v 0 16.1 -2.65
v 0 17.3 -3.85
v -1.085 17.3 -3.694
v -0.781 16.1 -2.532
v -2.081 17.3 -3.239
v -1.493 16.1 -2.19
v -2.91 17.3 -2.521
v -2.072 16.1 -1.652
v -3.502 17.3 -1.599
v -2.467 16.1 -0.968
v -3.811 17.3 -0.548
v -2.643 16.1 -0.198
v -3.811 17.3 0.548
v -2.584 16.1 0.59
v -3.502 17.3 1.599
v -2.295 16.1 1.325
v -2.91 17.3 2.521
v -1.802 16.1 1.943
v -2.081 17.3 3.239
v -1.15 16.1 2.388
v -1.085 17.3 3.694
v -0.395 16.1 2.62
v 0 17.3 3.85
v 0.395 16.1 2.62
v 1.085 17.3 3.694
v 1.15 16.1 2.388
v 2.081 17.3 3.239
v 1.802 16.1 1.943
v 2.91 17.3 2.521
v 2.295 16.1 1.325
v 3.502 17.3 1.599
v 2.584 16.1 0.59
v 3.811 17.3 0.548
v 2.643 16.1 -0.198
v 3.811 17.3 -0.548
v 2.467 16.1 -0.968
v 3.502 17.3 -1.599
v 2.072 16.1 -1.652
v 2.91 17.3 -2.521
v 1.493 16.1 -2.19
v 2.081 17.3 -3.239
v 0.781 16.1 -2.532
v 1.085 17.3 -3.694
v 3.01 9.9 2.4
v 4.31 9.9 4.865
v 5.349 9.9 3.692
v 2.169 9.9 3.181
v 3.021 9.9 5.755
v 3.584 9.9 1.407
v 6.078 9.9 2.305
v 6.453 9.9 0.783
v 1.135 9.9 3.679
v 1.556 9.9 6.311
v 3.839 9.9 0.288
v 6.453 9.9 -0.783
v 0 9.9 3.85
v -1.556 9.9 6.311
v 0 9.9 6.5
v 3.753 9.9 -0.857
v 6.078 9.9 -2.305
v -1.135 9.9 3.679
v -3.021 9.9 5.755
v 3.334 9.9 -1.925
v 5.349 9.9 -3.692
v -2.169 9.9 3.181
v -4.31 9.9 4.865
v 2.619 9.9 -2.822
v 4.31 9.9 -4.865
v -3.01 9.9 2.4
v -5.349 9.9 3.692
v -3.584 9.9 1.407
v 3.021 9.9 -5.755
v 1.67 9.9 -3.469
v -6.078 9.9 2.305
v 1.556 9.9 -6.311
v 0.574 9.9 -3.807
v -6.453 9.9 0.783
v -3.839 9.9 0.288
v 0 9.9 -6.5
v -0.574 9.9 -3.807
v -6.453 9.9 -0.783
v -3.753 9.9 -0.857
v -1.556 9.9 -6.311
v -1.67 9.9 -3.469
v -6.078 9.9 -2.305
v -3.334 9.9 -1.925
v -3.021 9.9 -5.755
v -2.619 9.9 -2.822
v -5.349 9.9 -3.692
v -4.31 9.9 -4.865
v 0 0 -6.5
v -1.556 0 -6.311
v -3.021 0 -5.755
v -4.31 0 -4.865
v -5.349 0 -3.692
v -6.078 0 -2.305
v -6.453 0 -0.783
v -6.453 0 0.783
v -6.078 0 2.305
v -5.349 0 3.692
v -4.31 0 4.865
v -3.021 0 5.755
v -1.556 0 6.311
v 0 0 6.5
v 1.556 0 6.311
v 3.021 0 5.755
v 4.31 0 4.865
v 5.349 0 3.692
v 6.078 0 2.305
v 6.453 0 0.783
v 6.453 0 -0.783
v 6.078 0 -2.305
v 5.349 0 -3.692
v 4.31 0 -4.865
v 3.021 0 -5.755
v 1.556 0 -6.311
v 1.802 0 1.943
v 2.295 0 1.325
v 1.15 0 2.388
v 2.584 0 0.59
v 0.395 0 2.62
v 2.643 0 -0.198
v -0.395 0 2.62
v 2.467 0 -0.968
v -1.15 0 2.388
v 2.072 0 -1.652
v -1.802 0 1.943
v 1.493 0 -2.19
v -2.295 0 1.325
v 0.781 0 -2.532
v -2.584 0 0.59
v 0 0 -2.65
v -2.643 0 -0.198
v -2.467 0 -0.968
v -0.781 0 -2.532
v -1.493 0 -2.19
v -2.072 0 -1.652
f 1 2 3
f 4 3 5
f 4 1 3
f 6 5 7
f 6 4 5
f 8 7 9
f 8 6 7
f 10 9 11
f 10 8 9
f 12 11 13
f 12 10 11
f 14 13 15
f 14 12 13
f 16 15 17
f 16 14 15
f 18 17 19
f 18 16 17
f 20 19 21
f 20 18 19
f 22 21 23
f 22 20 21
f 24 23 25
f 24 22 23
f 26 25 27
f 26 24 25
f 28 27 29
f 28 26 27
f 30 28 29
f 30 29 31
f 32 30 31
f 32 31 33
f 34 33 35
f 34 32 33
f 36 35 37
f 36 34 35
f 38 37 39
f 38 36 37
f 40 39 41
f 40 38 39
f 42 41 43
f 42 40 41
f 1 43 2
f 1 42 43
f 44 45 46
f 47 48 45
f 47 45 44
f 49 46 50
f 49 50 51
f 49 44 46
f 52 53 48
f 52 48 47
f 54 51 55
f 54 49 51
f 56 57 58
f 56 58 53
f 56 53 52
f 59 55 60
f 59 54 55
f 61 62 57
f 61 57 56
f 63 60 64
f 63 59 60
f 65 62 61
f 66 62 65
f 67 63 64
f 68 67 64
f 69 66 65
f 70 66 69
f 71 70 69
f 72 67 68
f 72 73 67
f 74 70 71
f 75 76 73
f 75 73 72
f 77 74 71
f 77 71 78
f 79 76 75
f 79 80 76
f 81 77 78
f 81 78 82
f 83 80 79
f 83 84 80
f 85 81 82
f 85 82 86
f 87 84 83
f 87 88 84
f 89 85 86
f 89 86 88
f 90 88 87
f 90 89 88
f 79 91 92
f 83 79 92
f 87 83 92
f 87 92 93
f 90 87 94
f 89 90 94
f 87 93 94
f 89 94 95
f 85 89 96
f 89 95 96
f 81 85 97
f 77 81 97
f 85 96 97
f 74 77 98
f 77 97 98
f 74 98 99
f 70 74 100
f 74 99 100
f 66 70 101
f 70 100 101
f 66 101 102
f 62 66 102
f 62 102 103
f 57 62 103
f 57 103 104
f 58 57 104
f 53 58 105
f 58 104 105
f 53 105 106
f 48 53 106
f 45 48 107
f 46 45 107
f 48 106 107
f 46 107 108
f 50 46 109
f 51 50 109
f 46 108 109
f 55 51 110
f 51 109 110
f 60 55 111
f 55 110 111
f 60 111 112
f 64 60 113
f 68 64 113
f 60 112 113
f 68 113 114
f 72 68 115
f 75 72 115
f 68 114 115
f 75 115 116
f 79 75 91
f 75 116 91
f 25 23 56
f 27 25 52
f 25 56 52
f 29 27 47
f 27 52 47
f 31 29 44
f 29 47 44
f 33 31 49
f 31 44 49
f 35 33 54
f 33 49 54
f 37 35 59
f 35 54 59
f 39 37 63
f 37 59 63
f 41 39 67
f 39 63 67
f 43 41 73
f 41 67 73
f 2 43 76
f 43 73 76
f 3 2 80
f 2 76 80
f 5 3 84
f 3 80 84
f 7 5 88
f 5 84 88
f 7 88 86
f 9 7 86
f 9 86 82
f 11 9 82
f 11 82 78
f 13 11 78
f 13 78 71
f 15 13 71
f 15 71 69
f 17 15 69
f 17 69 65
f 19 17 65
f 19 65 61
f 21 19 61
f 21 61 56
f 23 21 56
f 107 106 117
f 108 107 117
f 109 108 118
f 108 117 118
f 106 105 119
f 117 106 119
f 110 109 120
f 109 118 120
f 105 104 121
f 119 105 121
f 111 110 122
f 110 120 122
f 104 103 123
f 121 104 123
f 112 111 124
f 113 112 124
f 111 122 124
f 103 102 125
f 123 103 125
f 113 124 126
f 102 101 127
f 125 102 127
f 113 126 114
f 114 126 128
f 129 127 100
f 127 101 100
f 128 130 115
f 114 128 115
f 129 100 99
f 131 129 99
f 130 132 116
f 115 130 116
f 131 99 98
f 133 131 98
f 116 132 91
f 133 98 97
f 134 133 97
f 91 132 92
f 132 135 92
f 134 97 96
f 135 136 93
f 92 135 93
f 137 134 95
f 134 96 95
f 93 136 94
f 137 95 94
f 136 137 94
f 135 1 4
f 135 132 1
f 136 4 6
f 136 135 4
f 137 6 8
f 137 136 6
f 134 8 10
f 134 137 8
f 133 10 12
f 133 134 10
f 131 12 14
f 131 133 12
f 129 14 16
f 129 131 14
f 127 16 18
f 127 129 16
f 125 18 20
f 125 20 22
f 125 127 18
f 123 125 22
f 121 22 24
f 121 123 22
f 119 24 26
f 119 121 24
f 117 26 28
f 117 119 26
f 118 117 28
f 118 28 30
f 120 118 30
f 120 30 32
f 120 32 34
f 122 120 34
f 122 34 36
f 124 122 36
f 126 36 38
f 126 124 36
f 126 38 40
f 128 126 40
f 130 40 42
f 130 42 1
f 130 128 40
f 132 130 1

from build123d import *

# Parameters (mm, degrees)
ESQUISSE1_R        = 6.5
ESQUISSE1_R_2      = 2.65
BOSS_EXTRU_1_DEPTH = 9.9
ESQUISSE2_R        = 3.85
ESQUISSE2_R_2      = 2.65
BOSS_EXTRU_2_DEPTH = 7.5
CHANFREIN1_SIZE    = 1.3


with BuildPart() as part:
    # Esquisse1 → Boss.-Extru.1 (new body)
    with BuildSketch(Plane(origin=(0, 0, 0), x_dir=(1, 0, 0), z_dir=(0, 1, 0))):
        with Locations(Location((0, 0, 0), (0, 0, 90))):
            Circle(ESQUISSE1_R)
        with Locations(Location((0, 0, 0), (0, 0, 90))):
            Circle(ESQUISSE1_R_2, mode=Mode.SUBTRACT)
    extrude(amount=BOSS_EXTRU_1_DEPTH)

    # Esquisse2 → Boss.-Extru.2 (add)
    with BuildSketch(Plane(origin=(0, 9.9, 0), x_dir=(1, 0, 0), z_dir=(0, 1, 0))):
        with Locations(Location((0, 0, 0), (0, 0, 270))):
            Circle(ESQUISSE2_R)
        with Locations(Location((0, 0, 0), (0, 0, 90))):
            Circle(ESQUISSE2_R_2, mode=Mode.SUBTRACT)
    extrude(amount=BOSS_EXTRU_2_DEPTH)

    # Chanfrein1
    # the kernel refuses this chamfer: 1.3 mm, written as the material it takes off along each edge
    with BuildSketch(Plane(origin=(0, 17.4, 0), x_dir=(0, 0, -1), z_dir=(1, 0, 0))) as chanfrein1_piece_1:
        Polygon((2.65 + CHANFREIN1_SIZE, 0), (2.65, -CHANFREIN1_SIZE), (2.65, 0), align=None)
    revolve(axis=Axis((0, 17.4, 0), (0, 1, 0)), mode=Mode.SUBTRACT)


solid = part.part
